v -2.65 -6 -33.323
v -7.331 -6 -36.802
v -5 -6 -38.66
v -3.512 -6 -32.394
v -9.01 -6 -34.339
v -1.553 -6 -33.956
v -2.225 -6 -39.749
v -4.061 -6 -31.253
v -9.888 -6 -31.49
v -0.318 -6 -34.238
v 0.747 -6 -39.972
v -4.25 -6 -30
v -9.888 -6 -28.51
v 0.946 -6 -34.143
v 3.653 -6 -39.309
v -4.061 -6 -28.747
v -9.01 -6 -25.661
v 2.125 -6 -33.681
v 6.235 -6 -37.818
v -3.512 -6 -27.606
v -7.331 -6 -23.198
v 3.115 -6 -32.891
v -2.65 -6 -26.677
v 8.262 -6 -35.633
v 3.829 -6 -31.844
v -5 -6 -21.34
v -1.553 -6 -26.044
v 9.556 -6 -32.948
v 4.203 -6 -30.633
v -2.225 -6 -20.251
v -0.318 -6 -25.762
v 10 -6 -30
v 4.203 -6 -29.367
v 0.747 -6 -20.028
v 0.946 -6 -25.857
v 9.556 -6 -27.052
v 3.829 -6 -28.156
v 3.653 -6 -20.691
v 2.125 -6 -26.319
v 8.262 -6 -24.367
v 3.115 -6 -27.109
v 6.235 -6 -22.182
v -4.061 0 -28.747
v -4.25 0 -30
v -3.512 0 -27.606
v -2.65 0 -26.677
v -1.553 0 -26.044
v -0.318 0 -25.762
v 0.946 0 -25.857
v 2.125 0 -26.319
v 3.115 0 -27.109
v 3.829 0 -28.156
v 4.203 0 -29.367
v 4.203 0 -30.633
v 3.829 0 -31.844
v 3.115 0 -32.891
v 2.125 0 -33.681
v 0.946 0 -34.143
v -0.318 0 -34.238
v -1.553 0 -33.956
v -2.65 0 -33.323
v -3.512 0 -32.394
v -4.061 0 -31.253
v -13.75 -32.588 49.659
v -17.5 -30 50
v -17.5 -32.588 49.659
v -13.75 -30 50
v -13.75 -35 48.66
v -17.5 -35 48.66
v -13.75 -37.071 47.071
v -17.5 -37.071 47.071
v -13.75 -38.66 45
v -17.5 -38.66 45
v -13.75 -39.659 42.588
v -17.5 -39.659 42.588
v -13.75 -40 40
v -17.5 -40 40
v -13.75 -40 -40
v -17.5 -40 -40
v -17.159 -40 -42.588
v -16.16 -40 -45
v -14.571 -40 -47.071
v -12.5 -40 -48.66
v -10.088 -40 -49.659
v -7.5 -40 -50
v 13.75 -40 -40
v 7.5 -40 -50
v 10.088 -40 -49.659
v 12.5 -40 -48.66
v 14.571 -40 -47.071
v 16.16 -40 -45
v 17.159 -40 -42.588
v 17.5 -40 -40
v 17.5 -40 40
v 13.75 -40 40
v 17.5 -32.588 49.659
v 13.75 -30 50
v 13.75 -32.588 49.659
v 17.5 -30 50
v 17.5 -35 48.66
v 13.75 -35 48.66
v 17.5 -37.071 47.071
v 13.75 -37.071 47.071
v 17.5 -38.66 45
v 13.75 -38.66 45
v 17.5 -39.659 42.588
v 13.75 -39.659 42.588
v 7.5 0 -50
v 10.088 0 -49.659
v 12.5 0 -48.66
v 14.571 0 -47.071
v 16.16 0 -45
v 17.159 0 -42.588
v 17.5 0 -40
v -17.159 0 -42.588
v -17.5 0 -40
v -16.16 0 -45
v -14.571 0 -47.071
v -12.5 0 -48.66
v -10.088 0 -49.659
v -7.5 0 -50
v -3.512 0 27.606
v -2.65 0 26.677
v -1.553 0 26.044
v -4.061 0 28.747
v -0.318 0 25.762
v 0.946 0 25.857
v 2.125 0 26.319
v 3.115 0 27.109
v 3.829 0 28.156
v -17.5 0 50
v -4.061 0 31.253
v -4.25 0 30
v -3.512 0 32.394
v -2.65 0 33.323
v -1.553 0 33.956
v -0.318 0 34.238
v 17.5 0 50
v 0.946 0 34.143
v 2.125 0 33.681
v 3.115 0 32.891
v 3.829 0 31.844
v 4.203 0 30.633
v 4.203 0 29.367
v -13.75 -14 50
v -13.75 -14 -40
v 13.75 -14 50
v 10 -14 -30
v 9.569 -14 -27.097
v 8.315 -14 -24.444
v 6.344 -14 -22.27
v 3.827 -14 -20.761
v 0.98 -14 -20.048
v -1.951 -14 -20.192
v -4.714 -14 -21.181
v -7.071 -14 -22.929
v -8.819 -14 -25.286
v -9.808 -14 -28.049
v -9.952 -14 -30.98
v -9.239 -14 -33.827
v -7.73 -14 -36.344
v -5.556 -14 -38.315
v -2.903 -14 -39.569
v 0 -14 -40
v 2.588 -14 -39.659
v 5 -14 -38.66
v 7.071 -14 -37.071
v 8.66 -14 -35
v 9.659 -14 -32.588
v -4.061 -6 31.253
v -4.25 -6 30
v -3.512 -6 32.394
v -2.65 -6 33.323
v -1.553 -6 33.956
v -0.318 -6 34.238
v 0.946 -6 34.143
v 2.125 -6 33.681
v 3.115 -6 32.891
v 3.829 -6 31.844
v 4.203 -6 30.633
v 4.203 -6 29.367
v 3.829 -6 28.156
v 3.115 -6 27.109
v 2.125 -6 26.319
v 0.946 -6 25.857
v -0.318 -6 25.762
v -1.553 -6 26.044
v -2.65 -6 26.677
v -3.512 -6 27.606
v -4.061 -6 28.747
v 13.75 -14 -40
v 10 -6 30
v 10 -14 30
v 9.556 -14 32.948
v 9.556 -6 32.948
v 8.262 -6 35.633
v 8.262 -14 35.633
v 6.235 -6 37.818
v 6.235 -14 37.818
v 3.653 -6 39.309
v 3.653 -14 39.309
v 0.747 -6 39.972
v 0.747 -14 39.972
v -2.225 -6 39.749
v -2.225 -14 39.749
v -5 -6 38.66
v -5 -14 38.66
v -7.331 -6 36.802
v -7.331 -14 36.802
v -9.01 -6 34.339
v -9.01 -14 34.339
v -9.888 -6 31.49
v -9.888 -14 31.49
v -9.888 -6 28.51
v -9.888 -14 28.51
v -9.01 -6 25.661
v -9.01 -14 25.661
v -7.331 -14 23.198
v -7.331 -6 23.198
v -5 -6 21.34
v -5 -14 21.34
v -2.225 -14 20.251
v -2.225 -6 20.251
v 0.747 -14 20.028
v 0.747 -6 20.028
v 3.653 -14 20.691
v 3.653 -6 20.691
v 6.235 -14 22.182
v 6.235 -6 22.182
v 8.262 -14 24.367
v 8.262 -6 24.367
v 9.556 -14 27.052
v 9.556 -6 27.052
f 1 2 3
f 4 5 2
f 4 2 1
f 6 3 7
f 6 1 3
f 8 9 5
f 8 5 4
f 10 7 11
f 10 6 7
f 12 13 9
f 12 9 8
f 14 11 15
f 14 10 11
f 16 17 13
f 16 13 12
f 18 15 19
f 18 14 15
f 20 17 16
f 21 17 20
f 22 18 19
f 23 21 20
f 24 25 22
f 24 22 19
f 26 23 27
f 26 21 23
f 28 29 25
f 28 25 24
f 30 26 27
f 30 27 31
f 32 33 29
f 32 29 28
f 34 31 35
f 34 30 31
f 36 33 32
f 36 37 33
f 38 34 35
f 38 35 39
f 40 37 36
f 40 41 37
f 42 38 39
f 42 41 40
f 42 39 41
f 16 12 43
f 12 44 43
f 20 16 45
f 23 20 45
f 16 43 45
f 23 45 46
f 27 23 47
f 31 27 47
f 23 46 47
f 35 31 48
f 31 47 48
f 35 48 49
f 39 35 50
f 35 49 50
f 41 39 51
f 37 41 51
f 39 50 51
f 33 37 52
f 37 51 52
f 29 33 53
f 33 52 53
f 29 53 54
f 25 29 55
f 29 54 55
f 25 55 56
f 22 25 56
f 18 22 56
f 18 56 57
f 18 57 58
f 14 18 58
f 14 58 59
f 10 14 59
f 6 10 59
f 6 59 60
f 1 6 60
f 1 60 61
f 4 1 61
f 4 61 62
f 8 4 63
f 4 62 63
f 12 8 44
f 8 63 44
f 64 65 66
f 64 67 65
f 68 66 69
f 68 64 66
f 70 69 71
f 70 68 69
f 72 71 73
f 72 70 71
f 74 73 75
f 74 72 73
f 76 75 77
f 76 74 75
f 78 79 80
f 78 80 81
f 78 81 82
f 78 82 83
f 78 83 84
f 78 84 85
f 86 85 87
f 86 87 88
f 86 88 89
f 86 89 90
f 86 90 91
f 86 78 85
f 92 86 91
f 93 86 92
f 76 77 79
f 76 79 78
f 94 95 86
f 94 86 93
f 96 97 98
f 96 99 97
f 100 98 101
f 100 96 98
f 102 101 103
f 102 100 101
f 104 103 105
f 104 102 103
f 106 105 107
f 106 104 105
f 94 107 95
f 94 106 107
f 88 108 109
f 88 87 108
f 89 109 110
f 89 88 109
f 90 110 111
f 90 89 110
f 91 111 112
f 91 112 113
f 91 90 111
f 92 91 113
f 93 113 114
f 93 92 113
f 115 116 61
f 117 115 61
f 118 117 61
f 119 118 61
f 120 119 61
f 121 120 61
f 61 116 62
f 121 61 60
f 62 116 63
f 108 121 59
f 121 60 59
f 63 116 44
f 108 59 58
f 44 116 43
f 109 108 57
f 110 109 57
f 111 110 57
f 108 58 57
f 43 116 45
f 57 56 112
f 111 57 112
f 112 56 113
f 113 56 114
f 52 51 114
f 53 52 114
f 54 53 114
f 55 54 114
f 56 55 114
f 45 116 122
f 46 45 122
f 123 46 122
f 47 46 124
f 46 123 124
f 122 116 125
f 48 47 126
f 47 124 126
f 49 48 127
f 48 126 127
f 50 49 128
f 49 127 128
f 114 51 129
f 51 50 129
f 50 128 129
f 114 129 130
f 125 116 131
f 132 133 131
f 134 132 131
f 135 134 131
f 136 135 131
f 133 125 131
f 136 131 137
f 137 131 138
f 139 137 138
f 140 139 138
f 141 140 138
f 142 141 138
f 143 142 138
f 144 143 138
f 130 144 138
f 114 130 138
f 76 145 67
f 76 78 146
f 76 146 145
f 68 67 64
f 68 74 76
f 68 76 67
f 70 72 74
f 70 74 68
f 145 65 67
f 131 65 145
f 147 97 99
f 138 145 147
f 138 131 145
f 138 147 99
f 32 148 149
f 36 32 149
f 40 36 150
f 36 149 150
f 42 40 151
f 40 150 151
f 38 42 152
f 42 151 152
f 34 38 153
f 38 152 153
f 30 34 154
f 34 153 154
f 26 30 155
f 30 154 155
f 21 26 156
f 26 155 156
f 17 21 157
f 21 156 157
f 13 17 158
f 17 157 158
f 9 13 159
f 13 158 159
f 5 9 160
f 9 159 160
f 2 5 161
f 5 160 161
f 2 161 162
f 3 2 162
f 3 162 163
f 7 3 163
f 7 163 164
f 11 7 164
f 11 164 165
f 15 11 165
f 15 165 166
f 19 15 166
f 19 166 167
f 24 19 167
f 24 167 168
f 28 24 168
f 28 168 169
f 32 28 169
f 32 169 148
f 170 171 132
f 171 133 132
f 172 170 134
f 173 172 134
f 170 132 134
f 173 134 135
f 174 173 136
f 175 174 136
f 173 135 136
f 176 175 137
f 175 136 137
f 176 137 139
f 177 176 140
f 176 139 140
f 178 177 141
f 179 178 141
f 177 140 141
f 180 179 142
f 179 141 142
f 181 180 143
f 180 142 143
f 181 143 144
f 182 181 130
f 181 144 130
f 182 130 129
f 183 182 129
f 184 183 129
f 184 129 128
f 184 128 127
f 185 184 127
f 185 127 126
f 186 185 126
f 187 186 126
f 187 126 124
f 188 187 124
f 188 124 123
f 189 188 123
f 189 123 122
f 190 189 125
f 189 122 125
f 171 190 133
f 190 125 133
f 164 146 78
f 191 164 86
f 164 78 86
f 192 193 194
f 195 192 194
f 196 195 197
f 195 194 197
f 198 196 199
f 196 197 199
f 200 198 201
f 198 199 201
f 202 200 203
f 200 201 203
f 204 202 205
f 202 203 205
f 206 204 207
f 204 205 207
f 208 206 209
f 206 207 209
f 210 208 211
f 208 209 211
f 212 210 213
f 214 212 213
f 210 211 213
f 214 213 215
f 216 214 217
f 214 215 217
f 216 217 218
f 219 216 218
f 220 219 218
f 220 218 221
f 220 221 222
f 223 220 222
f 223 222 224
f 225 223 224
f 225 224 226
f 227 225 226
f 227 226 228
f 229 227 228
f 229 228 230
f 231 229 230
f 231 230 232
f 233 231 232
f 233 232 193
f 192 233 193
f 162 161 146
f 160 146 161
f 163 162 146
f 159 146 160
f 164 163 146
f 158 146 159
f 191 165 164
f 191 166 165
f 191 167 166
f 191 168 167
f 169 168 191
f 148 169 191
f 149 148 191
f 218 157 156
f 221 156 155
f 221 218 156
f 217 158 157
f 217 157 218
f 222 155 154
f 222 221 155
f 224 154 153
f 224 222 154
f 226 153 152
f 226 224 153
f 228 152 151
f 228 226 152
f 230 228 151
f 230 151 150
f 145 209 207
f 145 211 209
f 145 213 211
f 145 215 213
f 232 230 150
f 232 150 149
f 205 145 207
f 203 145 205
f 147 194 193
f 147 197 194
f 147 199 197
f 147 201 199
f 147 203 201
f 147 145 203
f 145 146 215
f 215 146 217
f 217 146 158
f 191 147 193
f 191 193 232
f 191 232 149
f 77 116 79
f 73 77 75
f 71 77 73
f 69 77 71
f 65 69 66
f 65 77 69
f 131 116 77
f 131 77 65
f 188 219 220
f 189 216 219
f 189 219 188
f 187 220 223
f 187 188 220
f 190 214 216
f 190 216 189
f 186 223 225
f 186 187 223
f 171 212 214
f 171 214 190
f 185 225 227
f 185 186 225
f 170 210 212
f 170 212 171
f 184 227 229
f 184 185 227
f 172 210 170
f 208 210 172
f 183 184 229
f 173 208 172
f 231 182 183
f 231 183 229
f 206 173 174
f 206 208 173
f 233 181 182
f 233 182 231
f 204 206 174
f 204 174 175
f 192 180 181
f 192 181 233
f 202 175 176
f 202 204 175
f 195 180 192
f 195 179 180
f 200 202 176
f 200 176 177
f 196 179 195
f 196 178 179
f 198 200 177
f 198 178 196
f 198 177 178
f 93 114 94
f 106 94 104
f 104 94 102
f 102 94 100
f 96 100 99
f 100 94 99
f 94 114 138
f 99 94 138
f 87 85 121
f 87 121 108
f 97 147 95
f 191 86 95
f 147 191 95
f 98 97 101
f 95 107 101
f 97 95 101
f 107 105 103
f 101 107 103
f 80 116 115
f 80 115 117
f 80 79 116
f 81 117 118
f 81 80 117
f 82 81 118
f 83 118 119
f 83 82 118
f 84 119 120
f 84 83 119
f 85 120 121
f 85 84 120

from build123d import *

# Parameters (mm, degrees)
F0_W           = 35
F0_H           = 100
F1_DEPTH       = 40
F2_W           = 27.5
F2_H           = 90
F3_DEPTH       = 26
F4_R           = 10
F6_D           = 8.5
F6_CBORE_D     = 20
F6_CBORE_DEPTH = 8


with BuildPart() as f1:
    # F0 (on Front) → F1 (new body)
    with BuildSketch(Plane.XZ):
        Rectangle(F0_W, F0_H)
    extrude(amount=F1_DEPTH)

    # F2 (on face) → F3 (cut)
    with BuildSketch(Plane.XZ.offset(40)):
        with Locations((0, 5)):
            Rectangle(F2_W, F2_H)
    extrude(amount=-F3_DEPTH, mode=Mode.SUBTRACT)

    # F4
    f4_edges = [f1.edges().sort_by_distance(p)[0] for p in [
        (-15.625, -40, 50),
        (15.625, -40, 50),
        (-17.5, -20, -50),
        (17.5, -20, -50),
    ]]
    fillet(f4_edges, radius=F4_R)

    # F6 (through all)
    with Locations(Plane.XZ.offset(14)):
        with Locations((0, 30), (0, -30)):
            CounterBoreHole(F6_D / 2, F6_CBORE_D / 2, F6_CBORE_DEPTH)


solid = f1.part
